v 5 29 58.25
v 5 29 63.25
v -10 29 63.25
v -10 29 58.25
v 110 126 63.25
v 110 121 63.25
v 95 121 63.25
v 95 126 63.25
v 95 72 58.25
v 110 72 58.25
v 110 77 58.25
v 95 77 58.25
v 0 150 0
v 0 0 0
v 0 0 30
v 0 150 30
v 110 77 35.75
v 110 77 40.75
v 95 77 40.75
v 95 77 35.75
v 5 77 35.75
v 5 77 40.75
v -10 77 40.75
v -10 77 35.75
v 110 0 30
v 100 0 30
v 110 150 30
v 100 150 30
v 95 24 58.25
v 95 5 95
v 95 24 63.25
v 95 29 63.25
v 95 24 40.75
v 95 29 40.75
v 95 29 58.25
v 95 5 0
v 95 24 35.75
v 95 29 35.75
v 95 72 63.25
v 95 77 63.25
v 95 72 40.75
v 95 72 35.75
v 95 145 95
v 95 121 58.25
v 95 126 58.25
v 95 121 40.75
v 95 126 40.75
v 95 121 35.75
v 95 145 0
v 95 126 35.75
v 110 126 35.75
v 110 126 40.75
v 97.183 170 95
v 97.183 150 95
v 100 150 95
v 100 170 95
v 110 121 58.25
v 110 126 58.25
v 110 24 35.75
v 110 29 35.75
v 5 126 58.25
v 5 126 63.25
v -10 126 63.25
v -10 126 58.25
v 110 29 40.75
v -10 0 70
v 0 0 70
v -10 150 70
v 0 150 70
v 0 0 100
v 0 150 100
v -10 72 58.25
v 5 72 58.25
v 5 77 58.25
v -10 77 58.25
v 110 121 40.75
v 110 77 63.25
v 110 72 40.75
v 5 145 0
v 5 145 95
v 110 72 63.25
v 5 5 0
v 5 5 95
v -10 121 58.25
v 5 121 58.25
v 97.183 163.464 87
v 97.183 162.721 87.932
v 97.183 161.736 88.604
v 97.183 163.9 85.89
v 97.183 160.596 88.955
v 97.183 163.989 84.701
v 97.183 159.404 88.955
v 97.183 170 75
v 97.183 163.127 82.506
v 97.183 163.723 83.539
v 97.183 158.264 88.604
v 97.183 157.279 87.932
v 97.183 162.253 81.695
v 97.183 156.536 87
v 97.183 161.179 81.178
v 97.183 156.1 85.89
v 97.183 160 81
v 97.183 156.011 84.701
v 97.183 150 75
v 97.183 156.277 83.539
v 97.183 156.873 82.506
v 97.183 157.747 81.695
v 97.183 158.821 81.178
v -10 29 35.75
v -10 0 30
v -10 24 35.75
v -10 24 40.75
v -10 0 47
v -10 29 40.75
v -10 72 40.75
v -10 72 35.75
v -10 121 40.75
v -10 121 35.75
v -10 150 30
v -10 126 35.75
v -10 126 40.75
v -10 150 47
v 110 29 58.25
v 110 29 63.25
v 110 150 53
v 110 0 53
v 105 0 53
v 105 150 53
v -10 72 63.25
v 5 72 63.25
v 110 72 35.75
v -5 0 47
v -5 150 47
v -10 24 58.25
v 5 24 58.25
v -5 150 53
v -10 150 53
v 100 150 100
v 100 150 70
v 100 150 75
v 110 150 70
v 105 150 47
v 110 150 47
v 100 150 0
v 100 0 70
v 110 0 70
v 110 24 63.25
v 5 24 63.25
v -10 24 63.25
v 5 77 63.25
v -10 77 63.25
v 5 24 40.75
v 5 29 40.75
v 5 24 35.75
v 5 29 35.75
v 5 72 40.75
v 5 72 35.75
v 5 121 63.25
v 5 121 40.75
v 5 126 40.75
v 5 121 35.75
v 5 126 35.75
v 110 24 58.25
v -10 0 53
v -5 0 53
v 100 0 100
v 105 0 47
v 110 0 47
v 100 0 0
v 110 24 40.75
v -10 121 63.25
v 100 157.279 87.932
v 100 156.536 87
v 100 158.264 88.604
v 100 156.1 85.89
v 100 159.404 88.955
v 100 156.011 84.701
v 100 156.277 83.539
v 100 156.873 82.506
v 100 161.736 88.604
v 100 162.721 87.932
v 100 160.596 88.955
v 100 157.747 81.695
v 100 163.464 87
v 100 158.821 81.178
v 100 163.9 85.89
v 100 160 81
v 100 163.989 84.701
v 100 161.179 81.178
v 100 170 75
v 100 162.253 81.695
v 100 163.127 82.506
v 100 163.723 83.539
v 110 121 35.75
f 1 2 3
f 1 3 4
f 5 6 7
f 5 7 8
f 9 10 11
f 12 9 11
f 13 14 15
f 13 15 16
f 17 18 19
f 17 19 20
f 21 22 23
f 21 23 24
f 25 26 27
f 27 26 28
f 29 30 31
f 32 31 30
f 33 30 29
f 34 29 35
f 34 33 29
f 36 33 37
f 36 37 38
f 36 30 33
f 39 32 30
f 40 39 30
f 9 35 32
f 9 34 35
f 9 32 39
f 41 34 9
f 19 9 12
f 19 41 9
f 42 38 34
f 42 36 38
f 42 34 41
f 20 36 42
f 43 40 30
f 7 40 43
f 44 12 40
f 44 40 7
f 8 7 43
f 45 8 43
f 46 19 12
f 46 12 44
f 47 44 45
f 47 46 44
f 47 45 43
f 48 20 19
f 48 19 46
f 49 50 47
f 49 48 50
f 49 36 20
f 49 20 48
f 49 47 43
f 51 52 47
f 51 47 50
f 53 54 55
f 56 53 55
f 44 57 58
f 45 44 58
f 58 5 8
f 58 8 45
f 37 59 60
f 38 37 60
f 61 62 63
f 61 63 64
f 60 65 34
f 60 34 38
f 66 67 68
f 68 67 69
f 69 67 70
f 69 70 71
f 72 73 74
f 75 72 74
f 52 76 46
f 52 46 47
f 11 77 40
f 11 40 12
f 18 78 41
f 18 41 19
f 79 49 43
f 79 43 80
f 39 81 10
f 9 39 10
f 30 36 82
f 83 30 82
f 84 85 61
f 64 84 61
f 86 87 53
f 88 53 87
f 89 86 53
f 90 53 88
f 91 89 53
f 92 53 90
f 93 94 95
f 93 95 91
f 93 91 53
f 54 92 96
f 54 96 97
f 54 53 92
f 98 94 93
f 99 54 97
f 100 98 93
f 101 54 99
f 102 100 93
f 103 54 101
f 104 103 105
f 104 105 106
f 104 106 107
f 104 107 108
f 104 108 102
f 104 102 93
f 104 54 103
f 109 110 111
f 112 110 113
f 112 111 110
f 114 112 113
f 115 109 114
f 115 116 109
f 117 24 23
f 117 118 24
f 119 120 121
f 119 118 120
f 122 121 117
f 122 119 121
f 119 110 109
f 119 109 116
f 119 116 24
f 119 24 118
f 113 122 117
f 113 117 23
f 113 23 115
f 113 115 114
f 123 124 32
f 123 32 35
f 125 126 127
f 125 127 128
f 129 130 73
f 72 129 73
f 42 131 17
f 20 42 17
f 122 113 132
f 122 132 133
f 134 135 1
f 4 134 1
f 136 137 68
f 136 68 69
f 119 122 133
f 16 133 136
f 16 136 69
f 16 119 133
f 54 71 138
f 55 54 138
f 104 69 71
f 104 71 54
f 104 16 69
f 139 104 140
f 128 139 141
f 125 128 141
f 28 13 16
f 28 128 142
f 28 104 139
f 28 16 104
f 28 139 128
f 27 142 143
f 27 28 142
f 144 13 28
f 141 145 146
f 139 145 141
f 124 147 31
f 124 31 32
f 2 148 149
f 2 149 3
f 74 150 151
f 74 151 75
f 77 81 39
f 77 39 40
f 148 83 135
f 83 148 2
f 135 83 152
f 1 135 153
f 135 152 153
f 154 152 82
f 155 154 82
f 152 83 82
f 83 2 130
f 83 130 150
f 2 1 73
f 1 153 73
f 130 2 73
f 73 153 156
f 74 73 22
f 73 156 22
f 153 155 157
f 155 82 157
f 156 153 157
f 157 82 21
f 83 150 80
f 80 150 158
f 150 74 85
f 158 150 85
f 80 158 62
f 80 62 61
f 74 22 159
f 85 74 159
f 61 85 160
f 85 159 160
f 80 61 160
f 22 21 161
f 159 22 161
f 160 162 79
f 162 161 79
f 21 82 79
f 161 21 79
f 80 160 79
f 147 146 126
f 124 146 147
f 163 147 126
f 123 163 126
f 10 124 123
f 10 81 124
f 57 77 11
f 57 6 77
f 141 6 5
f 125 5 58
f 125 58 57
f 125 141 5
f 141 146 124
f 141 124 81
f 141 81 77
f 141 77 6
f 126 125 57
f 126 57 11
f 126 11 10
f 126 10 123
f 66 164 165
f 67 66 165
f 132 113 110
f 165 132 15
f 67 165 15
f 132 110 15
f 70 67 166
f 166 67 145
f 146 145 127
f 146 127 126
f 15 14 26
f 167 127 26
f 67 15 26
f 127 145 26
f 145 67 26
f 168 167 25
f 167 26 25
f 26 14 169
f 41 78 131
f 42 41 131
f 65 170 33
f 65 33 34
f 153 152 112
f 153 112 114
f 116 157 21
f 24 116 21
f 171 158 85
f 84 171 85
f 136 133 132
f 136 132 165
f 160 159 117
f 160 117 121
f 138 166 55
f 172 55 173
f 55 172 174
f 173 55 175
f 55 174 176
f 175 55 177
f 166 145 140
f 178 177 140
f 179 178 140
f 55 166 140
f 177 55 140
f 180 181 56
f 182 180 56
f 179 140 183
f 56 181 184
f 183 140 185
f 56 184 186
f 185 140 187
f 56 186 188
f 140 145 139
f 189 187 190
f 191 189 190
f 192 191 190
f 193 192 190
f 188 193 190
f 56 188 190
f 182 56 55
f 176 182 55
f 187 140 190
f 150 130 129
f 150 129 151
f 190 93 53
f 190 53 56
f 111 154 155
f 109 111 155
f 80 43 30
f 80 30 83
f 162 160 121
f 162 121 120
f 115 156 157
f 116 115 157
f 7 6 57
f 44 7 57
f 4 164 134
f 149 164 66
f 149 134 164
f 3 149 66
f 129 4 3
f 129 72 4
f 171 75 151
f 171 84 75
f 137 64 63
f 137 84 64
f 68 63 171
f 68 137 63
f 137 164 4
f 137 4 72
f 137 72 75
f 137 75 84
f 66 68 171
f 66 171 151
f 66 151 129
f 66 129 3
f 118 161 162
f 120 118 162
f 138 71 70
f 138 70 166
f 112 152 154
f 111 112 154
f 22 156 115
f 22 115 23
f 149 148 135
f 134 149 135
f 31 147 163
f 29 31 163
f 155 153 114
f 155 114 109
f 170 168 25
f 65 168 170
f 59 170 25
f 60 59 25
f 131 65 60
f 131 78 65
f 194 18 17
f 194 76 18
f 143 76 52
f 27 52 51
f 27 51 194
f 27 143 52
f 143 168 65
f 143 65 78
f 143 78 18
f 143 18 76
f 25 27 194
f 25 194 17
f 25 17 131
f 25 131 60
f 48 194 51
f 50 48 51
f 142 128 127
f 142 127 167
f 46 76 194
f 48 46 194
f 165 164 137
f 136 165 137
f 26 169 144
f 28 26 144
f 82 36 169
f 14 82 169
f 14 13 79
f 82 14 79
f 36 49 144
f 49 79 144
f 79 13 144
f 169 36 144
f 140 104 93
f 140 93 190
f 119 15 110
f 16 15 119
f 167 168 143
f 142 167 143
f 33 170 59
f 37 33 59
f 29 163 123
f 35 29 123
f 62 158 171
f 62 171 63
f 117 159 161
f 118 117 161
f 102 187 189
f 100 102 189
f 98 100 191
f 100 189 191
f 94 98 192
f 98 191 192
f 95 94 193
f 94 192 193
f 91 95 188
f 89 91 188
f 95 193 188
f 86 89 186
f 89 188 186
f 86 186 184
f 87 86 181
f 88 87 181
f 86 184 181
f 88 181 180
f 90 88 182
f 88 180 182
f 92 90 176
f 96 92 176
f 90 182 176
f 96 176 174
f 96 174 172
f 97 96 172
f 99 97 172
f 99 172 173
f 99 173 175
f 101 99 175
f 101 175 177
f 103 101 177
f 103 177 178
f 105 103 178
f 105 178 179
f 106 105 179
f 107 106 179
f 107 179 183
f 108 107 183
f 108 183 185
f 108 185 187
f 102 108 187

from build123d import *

# Parameters (mm, degrees)
ESQUISSE1_W             = 100
ESQUISSE1_H             = 150
BOSS_EXTRU_1_DEPTH      = 100
ESQUISSE2_W             = 90
ESQUISSE2_H             = 140
ENL_V_MAT_EXTRU_1_DEPTH = 95
ESQUISSE4_W             = 40
ESQUISSE4_H             = 150
BOSS_EXTRU_2_DEPTH      = 10
ESQUISSE5_W             = 6
ESQUISSE5_H             = 150
ENL_V_MAT_EXTRU_2_DEPTH = 5
ESQUISSE7_W             = 40
ESQUISSE7_H             = 150
BOSS_EXTRU_3_DEPTH      = 10
ESQUISSE8_W             = 6
ESQUISSE8_H             = 150
ENL_V_MAT_EXTRU_3_DEPTH = 5
ESQUISSE9_W             = 5
ESQUISSE9_H             = 5
ENL_V_MAT_EXTRU_4_DEPTH = 121
ESQUISSE10_W            = 2.816855809
ESQUISSE10_H            = 20
BOSS_EXTRU_4_DEPTH      = 20
ESQUISSE11_R            = 4
ENL_V_MAT_EXTRU_5_DEPTH = 111


with BuildPart() as part:
    # Esquisse1 → Boss.-Extru.1 (new body)
    with BuildSketch(Plane.XY):
        with Locations((50, 75)):
            Rectangle(ESQUISSE1_W, ESQUISSE1_H)
    extrude(amount=BOSS_EXTRU_1_DEPTH)

    # Esquisse2 → Enlèv. mat.-Extru.1 (cut)
    with BuildSketch(Plane(origin=(0, 0, 0), x_dir=(-1, 0, 0), z_dir=(0, 0, -1))):
        with Locations((-50, 75)):
            Rectangle(ESQUISSE2_W, ESQUISSE2_H)
    extrude(amount=-ENL_V_MAT_EXTRU_1_DEPTH, mode=Mode.SUBTRACT)

    # Esquisse4 → Boss.-Extru.2 (add)
    with BuildSketch(Plane.ZY):
        with Locations((50, 75)):
            Rectangle(ESQUISSE4_W, ESQUISSE4_H)
    extrude(amount=BOSS_EXTRU_2_DEPTH)

    # Esquisse5 → Enlèv. mat.-Extru.2 (cut)
    with BuildSketch(Plane.ZY.offset(10)):
        with Locations((50, 75)):
            Rectangle(ESQUISSE5_W, ESQUISSE5_H)
    extrude(amount=-ENL_V_MAT_EXTRU_2_DEPTH, mode=Mode.SUBTRACT)

    # Esquisse7 → Boss.-Extru.3 (add)
    with BuildSketch(Plane(origin=(100, 0, 0), x_dir=(0, 0, -1), z_dir=(1, 0, 0))):
        with Locations((-50, 75)):
            Rectangle(ESQUISSE7_W, ESQUISSE7_H)
    extrude(amount=BOSS_EXTRU_3_DEPTH)

    # Esquisse8 → Enlèv. mat.-Extru.3 (cut)
    with BuildSketch(Plane(origin=(110, 0, 0), x_dir=(0, 0, -1), z_dir=(1, 0, 0))):
        with Locations((-50, 75)):
            Rectangle(ESQUISSE8_W, ESQUISSE8_H)
    extrude(amount=-ENL_V_MAT_EXTRU_3_DEPTH, mode=Mode.SUBTRACT)

    # Esquisse9 → Enlèv. mat.-Extru.4 (cut, through all)
    with BuildSketch(Plane(origin=(110, 0, 0), x_dir=(0, 0, -1), z_dir=(1, 0, 0))):
        with Locations((-38.25, 123.5)):
            Rectangle(ESQUISSE9_W, ESQUISSE9_H)
        with Locations((-60.75, 74.5)):
            Rectangle(ESQUISSE9_W, ESQUISSE9_H)
        with Locations((-38.25, 74.5)):
            Rectangle(ESQUISSE9_W, ESQUISSE9_H)
        with Locations((-60.75, 26.5)):
            Rectangle(ESQUISSE9_W, ESQUISSE9_H)
        with Locations((-60.75, 123.5)):
            Rectangle(ESQUISSE9_W, ESQUISSE9_H)
        with Locations((-38.25, 26.5)):
            Rectangle(ESQUISSE9_W, ESQUISSE9_H)
    extrude(amount=-ENL_V_MAT_EXTRU_4_DEPTH, mode=Mode.SUBTRACT)

    # Esquisse10 → Boss.-Extru.4 (add)
    with BuildSketch(Plane(origin=(0, 150, 0), x_dir=(1, 0, 0), z_dir=(0, 1, 0))):
        with Locations((98.591572095, -85)):
            Rectangle(ESQUISSE10_W, ESQUISSE10_H)
    extrude(amount=BOSS_EXTRU_4_DEPTH)

    # Esquisse11 → Enlèv. mat.-Extru.5 (cut, through all)
    with BuildSketch(Plane(origin=(100, 0, 0), x_dir=(0, 0, -1), z_dir=(1, 0, 0))):
        with Locations((-85, 160)):
            Circle(ESQUISSE11_R)
    extrude(amount=-ENL_V_MAT_EXTRU_5_DEPTH, mode=Mode.SUBTRACT)


solid = part.part
